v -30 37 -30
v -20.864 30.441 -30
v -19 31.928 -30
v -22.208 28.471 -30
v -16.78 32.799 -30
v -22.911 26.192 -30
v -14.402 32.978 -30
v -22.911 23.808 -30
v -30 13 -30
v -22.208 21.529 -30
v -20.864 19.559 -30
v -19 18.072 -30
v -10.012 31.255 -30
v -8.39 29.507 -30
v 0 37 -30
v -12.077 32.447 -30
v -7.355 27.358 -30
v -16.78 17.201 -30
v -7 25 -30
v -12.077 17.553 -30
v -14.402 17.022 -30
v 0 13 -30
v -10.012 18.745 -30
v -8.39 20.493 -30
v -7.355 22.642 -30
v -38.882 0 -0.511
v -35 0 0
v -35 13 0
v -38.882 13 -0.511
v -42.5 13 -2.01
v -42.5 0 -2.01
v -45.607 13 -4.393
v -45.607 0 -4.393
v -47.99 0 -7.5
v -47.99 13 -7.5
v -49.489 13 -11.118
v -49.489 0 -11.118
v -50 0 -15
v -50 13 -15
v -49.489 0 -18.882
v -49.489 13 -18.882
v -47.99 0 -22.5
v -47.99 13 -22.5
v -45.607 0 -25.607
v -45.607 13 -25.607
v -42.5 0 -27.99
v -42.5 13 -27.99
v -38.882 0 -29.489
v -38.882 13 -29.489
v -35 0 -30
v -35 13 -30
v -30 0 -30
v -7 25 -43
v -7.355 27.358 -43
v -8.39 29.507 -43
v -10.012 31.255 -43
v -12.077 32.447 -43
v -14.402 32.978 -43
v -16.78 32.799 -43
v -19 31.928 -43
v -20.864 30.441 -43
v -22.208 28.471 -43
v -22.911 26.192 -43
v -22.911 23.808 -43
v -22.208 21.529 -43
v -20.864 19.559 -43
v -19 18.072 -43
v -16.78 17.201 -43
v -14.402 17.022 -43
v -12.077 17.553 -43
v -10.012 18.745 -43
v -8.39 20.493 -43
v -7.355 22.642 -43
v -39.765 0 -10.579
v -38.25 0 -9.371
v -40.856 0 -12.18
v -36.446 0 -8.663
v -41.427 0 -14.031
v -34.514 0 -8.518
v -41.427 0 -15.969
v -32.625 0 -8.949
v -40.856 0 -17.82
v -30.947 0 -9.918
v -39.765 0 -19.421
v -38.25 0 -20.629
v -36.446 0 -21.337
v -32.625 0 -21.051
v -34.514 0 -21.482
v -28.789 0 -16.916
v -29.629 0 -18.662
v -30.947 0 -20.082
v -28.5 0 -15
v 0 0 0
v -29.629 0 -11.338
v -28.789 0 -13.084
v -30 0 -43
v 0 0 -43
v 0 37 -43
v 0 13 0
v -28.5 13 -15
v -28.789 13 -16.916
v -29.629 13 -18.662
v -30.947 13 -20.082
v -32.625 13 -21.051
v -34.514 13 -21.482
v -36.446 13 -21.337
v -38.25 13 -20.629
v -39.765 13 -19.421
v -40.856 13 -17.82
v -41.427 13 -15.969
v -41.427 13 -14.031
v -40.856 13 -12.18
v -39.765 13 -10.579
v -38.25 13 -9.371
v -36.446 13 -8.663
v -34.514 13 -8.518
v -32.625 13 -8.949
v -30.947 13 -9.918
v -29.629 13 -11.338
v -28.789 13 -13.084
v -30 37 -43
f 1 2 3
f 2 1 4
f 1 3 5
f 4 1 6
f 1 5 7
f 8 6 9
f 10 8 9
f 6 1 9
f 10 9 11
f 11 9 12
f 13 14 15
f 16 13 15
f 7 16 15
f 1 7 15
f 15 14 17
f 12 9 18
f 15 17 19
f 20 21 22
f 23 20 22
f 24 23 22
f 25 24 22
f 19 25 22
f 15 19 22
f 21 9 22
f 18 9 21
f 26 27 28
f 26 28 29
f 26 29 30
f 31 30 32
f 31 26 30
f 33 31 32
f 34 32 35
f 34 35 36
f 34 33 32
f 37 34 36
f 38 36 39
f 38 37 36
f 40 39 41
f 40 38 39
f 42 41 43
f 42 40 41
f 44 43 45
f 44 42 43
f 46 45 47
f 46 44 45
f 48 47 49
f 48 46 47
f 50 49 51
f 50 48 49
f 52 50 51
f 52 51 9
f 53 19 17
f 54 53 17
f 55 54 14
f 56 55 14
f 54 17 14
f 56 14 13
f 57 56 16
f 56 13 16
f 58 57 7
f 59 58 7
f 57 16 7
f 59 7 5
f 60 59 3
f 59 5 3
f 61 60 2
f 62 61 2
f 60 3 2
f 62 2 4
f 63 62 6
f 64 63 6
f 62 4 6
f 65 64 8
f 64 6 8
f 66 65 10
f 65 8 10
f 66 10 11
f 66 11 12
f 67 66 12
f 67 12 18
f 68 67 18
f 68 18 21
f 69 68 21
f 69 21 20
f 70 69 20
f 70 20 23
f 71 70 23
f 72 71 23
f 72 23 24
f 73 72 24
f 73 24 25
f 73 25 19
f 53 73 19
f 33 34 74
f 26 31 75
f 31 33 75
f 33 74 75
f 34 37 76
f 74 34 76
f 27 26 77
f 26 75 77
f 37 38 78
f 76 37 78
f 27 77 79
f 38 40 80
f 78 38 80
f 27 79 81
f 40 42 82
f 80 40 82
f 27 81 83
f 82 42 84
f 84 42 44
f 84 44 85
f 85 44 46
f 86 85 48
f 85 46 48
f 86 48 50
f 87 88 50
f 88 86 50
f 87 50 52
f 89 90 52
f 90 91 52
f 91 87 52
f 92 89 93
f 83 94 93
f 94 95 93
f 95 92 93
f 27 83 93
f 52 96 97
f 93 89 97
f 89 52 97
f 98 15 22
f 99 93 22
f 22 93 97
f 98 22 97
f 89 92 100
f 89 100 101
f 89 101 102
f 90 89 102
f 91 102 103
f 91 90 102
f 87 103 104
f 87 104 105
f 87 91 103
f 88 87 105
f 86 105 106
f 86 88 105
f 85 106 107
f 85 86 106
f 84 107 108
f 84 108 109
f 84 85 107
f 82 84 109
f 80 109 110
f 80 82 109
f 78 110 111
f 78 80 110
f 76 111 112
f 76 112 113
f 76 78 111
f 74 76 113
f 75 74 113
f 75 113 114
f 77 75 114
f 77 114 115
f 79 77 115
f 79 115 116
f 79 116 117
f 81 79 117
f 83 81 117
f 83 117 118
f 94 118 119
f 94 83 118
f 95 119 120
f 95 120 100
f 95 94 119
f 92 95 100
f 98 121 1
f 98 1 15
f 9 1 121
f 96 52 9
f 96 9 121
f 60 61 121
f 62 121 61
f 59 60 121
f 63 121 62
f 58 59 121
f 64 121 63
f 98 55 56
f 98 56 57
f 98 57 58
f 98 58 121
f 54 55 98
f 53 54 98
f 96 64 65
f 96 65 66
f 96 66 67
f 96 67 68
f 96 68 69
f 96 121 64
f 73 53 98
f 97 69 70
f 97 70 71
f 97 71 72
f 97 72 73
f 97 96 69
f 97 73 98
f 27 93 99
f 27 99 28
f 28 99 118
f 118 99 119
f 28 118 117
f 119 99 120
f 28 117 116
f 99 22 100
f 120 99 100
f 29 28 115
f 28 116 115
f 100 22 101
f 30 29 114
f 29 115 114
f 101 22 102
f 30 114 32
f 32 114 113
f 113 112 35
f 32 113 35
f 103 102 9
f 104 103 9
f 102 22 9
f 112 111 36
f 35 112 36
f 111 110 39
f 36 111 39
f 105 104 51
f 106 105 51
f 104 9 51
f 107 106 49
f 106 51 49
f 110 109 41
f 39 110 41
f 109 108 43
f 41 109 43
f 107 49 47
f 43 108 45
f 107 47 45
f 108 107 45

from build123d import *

# Parameters (mm, degrees)
SKETCH1_R           = 6.5
BOSS_EXTRUDE1_DEPTH = 13
SKETCH2_W           = 30
SKETCH2_H           = 13
BOSS_EXTRUDE2_DEPTH = 37
SKETCH3_R           = 8
CUT_EXTRUDE1_DEPTH  = 43


with BuildPart() as part:
    # Sketch1 → Boss-Extrude1 (new body)
    with BuildSketch(Plane(origin=(0, 0, 0), x_dir=(1, 0, 0), z_dir=(0, 1, 0))):
        with BuildLine():
            Line((0, 0), (-35, 0))
            ThreePointArc((-35, 0), (-50, 15), (-35, 30))
            Line((-35, 30), (0, 30))
            Line((0, 30), (0, 0))
        make_face()
        with Locations((-35, 15)):
            Circle(SKETCH1_R, mode=Mode.SUBTRACT)
    extrude(amount=BOSS_EXTRUDE1_DEPTH)

    # Sketch2 → Boss-Extrude2 (add)
    with BuildSketch(Plane(origin=(0, 0, 0), x_dir=(1, 0, 0), z_dir=(0, 1, 0))):
        with Locations((-15, 36.5)):
            Rectangle(SKETCH2_W, SKETCH2_H)
    extrude(amount=BOSS_EXTRUDE2_DEPTH)

    # Sketch3 → Cut-Extrude1 (cut)
    with BuildSketch(Plane.XY):
        with Locations((-15, 25)):
            Circle(SKETCH3_R)
    extrude(amount=-CUT_EXTRUDE1_DEPTH, mode=Mode.SUBTRACT)


solid = part.part
